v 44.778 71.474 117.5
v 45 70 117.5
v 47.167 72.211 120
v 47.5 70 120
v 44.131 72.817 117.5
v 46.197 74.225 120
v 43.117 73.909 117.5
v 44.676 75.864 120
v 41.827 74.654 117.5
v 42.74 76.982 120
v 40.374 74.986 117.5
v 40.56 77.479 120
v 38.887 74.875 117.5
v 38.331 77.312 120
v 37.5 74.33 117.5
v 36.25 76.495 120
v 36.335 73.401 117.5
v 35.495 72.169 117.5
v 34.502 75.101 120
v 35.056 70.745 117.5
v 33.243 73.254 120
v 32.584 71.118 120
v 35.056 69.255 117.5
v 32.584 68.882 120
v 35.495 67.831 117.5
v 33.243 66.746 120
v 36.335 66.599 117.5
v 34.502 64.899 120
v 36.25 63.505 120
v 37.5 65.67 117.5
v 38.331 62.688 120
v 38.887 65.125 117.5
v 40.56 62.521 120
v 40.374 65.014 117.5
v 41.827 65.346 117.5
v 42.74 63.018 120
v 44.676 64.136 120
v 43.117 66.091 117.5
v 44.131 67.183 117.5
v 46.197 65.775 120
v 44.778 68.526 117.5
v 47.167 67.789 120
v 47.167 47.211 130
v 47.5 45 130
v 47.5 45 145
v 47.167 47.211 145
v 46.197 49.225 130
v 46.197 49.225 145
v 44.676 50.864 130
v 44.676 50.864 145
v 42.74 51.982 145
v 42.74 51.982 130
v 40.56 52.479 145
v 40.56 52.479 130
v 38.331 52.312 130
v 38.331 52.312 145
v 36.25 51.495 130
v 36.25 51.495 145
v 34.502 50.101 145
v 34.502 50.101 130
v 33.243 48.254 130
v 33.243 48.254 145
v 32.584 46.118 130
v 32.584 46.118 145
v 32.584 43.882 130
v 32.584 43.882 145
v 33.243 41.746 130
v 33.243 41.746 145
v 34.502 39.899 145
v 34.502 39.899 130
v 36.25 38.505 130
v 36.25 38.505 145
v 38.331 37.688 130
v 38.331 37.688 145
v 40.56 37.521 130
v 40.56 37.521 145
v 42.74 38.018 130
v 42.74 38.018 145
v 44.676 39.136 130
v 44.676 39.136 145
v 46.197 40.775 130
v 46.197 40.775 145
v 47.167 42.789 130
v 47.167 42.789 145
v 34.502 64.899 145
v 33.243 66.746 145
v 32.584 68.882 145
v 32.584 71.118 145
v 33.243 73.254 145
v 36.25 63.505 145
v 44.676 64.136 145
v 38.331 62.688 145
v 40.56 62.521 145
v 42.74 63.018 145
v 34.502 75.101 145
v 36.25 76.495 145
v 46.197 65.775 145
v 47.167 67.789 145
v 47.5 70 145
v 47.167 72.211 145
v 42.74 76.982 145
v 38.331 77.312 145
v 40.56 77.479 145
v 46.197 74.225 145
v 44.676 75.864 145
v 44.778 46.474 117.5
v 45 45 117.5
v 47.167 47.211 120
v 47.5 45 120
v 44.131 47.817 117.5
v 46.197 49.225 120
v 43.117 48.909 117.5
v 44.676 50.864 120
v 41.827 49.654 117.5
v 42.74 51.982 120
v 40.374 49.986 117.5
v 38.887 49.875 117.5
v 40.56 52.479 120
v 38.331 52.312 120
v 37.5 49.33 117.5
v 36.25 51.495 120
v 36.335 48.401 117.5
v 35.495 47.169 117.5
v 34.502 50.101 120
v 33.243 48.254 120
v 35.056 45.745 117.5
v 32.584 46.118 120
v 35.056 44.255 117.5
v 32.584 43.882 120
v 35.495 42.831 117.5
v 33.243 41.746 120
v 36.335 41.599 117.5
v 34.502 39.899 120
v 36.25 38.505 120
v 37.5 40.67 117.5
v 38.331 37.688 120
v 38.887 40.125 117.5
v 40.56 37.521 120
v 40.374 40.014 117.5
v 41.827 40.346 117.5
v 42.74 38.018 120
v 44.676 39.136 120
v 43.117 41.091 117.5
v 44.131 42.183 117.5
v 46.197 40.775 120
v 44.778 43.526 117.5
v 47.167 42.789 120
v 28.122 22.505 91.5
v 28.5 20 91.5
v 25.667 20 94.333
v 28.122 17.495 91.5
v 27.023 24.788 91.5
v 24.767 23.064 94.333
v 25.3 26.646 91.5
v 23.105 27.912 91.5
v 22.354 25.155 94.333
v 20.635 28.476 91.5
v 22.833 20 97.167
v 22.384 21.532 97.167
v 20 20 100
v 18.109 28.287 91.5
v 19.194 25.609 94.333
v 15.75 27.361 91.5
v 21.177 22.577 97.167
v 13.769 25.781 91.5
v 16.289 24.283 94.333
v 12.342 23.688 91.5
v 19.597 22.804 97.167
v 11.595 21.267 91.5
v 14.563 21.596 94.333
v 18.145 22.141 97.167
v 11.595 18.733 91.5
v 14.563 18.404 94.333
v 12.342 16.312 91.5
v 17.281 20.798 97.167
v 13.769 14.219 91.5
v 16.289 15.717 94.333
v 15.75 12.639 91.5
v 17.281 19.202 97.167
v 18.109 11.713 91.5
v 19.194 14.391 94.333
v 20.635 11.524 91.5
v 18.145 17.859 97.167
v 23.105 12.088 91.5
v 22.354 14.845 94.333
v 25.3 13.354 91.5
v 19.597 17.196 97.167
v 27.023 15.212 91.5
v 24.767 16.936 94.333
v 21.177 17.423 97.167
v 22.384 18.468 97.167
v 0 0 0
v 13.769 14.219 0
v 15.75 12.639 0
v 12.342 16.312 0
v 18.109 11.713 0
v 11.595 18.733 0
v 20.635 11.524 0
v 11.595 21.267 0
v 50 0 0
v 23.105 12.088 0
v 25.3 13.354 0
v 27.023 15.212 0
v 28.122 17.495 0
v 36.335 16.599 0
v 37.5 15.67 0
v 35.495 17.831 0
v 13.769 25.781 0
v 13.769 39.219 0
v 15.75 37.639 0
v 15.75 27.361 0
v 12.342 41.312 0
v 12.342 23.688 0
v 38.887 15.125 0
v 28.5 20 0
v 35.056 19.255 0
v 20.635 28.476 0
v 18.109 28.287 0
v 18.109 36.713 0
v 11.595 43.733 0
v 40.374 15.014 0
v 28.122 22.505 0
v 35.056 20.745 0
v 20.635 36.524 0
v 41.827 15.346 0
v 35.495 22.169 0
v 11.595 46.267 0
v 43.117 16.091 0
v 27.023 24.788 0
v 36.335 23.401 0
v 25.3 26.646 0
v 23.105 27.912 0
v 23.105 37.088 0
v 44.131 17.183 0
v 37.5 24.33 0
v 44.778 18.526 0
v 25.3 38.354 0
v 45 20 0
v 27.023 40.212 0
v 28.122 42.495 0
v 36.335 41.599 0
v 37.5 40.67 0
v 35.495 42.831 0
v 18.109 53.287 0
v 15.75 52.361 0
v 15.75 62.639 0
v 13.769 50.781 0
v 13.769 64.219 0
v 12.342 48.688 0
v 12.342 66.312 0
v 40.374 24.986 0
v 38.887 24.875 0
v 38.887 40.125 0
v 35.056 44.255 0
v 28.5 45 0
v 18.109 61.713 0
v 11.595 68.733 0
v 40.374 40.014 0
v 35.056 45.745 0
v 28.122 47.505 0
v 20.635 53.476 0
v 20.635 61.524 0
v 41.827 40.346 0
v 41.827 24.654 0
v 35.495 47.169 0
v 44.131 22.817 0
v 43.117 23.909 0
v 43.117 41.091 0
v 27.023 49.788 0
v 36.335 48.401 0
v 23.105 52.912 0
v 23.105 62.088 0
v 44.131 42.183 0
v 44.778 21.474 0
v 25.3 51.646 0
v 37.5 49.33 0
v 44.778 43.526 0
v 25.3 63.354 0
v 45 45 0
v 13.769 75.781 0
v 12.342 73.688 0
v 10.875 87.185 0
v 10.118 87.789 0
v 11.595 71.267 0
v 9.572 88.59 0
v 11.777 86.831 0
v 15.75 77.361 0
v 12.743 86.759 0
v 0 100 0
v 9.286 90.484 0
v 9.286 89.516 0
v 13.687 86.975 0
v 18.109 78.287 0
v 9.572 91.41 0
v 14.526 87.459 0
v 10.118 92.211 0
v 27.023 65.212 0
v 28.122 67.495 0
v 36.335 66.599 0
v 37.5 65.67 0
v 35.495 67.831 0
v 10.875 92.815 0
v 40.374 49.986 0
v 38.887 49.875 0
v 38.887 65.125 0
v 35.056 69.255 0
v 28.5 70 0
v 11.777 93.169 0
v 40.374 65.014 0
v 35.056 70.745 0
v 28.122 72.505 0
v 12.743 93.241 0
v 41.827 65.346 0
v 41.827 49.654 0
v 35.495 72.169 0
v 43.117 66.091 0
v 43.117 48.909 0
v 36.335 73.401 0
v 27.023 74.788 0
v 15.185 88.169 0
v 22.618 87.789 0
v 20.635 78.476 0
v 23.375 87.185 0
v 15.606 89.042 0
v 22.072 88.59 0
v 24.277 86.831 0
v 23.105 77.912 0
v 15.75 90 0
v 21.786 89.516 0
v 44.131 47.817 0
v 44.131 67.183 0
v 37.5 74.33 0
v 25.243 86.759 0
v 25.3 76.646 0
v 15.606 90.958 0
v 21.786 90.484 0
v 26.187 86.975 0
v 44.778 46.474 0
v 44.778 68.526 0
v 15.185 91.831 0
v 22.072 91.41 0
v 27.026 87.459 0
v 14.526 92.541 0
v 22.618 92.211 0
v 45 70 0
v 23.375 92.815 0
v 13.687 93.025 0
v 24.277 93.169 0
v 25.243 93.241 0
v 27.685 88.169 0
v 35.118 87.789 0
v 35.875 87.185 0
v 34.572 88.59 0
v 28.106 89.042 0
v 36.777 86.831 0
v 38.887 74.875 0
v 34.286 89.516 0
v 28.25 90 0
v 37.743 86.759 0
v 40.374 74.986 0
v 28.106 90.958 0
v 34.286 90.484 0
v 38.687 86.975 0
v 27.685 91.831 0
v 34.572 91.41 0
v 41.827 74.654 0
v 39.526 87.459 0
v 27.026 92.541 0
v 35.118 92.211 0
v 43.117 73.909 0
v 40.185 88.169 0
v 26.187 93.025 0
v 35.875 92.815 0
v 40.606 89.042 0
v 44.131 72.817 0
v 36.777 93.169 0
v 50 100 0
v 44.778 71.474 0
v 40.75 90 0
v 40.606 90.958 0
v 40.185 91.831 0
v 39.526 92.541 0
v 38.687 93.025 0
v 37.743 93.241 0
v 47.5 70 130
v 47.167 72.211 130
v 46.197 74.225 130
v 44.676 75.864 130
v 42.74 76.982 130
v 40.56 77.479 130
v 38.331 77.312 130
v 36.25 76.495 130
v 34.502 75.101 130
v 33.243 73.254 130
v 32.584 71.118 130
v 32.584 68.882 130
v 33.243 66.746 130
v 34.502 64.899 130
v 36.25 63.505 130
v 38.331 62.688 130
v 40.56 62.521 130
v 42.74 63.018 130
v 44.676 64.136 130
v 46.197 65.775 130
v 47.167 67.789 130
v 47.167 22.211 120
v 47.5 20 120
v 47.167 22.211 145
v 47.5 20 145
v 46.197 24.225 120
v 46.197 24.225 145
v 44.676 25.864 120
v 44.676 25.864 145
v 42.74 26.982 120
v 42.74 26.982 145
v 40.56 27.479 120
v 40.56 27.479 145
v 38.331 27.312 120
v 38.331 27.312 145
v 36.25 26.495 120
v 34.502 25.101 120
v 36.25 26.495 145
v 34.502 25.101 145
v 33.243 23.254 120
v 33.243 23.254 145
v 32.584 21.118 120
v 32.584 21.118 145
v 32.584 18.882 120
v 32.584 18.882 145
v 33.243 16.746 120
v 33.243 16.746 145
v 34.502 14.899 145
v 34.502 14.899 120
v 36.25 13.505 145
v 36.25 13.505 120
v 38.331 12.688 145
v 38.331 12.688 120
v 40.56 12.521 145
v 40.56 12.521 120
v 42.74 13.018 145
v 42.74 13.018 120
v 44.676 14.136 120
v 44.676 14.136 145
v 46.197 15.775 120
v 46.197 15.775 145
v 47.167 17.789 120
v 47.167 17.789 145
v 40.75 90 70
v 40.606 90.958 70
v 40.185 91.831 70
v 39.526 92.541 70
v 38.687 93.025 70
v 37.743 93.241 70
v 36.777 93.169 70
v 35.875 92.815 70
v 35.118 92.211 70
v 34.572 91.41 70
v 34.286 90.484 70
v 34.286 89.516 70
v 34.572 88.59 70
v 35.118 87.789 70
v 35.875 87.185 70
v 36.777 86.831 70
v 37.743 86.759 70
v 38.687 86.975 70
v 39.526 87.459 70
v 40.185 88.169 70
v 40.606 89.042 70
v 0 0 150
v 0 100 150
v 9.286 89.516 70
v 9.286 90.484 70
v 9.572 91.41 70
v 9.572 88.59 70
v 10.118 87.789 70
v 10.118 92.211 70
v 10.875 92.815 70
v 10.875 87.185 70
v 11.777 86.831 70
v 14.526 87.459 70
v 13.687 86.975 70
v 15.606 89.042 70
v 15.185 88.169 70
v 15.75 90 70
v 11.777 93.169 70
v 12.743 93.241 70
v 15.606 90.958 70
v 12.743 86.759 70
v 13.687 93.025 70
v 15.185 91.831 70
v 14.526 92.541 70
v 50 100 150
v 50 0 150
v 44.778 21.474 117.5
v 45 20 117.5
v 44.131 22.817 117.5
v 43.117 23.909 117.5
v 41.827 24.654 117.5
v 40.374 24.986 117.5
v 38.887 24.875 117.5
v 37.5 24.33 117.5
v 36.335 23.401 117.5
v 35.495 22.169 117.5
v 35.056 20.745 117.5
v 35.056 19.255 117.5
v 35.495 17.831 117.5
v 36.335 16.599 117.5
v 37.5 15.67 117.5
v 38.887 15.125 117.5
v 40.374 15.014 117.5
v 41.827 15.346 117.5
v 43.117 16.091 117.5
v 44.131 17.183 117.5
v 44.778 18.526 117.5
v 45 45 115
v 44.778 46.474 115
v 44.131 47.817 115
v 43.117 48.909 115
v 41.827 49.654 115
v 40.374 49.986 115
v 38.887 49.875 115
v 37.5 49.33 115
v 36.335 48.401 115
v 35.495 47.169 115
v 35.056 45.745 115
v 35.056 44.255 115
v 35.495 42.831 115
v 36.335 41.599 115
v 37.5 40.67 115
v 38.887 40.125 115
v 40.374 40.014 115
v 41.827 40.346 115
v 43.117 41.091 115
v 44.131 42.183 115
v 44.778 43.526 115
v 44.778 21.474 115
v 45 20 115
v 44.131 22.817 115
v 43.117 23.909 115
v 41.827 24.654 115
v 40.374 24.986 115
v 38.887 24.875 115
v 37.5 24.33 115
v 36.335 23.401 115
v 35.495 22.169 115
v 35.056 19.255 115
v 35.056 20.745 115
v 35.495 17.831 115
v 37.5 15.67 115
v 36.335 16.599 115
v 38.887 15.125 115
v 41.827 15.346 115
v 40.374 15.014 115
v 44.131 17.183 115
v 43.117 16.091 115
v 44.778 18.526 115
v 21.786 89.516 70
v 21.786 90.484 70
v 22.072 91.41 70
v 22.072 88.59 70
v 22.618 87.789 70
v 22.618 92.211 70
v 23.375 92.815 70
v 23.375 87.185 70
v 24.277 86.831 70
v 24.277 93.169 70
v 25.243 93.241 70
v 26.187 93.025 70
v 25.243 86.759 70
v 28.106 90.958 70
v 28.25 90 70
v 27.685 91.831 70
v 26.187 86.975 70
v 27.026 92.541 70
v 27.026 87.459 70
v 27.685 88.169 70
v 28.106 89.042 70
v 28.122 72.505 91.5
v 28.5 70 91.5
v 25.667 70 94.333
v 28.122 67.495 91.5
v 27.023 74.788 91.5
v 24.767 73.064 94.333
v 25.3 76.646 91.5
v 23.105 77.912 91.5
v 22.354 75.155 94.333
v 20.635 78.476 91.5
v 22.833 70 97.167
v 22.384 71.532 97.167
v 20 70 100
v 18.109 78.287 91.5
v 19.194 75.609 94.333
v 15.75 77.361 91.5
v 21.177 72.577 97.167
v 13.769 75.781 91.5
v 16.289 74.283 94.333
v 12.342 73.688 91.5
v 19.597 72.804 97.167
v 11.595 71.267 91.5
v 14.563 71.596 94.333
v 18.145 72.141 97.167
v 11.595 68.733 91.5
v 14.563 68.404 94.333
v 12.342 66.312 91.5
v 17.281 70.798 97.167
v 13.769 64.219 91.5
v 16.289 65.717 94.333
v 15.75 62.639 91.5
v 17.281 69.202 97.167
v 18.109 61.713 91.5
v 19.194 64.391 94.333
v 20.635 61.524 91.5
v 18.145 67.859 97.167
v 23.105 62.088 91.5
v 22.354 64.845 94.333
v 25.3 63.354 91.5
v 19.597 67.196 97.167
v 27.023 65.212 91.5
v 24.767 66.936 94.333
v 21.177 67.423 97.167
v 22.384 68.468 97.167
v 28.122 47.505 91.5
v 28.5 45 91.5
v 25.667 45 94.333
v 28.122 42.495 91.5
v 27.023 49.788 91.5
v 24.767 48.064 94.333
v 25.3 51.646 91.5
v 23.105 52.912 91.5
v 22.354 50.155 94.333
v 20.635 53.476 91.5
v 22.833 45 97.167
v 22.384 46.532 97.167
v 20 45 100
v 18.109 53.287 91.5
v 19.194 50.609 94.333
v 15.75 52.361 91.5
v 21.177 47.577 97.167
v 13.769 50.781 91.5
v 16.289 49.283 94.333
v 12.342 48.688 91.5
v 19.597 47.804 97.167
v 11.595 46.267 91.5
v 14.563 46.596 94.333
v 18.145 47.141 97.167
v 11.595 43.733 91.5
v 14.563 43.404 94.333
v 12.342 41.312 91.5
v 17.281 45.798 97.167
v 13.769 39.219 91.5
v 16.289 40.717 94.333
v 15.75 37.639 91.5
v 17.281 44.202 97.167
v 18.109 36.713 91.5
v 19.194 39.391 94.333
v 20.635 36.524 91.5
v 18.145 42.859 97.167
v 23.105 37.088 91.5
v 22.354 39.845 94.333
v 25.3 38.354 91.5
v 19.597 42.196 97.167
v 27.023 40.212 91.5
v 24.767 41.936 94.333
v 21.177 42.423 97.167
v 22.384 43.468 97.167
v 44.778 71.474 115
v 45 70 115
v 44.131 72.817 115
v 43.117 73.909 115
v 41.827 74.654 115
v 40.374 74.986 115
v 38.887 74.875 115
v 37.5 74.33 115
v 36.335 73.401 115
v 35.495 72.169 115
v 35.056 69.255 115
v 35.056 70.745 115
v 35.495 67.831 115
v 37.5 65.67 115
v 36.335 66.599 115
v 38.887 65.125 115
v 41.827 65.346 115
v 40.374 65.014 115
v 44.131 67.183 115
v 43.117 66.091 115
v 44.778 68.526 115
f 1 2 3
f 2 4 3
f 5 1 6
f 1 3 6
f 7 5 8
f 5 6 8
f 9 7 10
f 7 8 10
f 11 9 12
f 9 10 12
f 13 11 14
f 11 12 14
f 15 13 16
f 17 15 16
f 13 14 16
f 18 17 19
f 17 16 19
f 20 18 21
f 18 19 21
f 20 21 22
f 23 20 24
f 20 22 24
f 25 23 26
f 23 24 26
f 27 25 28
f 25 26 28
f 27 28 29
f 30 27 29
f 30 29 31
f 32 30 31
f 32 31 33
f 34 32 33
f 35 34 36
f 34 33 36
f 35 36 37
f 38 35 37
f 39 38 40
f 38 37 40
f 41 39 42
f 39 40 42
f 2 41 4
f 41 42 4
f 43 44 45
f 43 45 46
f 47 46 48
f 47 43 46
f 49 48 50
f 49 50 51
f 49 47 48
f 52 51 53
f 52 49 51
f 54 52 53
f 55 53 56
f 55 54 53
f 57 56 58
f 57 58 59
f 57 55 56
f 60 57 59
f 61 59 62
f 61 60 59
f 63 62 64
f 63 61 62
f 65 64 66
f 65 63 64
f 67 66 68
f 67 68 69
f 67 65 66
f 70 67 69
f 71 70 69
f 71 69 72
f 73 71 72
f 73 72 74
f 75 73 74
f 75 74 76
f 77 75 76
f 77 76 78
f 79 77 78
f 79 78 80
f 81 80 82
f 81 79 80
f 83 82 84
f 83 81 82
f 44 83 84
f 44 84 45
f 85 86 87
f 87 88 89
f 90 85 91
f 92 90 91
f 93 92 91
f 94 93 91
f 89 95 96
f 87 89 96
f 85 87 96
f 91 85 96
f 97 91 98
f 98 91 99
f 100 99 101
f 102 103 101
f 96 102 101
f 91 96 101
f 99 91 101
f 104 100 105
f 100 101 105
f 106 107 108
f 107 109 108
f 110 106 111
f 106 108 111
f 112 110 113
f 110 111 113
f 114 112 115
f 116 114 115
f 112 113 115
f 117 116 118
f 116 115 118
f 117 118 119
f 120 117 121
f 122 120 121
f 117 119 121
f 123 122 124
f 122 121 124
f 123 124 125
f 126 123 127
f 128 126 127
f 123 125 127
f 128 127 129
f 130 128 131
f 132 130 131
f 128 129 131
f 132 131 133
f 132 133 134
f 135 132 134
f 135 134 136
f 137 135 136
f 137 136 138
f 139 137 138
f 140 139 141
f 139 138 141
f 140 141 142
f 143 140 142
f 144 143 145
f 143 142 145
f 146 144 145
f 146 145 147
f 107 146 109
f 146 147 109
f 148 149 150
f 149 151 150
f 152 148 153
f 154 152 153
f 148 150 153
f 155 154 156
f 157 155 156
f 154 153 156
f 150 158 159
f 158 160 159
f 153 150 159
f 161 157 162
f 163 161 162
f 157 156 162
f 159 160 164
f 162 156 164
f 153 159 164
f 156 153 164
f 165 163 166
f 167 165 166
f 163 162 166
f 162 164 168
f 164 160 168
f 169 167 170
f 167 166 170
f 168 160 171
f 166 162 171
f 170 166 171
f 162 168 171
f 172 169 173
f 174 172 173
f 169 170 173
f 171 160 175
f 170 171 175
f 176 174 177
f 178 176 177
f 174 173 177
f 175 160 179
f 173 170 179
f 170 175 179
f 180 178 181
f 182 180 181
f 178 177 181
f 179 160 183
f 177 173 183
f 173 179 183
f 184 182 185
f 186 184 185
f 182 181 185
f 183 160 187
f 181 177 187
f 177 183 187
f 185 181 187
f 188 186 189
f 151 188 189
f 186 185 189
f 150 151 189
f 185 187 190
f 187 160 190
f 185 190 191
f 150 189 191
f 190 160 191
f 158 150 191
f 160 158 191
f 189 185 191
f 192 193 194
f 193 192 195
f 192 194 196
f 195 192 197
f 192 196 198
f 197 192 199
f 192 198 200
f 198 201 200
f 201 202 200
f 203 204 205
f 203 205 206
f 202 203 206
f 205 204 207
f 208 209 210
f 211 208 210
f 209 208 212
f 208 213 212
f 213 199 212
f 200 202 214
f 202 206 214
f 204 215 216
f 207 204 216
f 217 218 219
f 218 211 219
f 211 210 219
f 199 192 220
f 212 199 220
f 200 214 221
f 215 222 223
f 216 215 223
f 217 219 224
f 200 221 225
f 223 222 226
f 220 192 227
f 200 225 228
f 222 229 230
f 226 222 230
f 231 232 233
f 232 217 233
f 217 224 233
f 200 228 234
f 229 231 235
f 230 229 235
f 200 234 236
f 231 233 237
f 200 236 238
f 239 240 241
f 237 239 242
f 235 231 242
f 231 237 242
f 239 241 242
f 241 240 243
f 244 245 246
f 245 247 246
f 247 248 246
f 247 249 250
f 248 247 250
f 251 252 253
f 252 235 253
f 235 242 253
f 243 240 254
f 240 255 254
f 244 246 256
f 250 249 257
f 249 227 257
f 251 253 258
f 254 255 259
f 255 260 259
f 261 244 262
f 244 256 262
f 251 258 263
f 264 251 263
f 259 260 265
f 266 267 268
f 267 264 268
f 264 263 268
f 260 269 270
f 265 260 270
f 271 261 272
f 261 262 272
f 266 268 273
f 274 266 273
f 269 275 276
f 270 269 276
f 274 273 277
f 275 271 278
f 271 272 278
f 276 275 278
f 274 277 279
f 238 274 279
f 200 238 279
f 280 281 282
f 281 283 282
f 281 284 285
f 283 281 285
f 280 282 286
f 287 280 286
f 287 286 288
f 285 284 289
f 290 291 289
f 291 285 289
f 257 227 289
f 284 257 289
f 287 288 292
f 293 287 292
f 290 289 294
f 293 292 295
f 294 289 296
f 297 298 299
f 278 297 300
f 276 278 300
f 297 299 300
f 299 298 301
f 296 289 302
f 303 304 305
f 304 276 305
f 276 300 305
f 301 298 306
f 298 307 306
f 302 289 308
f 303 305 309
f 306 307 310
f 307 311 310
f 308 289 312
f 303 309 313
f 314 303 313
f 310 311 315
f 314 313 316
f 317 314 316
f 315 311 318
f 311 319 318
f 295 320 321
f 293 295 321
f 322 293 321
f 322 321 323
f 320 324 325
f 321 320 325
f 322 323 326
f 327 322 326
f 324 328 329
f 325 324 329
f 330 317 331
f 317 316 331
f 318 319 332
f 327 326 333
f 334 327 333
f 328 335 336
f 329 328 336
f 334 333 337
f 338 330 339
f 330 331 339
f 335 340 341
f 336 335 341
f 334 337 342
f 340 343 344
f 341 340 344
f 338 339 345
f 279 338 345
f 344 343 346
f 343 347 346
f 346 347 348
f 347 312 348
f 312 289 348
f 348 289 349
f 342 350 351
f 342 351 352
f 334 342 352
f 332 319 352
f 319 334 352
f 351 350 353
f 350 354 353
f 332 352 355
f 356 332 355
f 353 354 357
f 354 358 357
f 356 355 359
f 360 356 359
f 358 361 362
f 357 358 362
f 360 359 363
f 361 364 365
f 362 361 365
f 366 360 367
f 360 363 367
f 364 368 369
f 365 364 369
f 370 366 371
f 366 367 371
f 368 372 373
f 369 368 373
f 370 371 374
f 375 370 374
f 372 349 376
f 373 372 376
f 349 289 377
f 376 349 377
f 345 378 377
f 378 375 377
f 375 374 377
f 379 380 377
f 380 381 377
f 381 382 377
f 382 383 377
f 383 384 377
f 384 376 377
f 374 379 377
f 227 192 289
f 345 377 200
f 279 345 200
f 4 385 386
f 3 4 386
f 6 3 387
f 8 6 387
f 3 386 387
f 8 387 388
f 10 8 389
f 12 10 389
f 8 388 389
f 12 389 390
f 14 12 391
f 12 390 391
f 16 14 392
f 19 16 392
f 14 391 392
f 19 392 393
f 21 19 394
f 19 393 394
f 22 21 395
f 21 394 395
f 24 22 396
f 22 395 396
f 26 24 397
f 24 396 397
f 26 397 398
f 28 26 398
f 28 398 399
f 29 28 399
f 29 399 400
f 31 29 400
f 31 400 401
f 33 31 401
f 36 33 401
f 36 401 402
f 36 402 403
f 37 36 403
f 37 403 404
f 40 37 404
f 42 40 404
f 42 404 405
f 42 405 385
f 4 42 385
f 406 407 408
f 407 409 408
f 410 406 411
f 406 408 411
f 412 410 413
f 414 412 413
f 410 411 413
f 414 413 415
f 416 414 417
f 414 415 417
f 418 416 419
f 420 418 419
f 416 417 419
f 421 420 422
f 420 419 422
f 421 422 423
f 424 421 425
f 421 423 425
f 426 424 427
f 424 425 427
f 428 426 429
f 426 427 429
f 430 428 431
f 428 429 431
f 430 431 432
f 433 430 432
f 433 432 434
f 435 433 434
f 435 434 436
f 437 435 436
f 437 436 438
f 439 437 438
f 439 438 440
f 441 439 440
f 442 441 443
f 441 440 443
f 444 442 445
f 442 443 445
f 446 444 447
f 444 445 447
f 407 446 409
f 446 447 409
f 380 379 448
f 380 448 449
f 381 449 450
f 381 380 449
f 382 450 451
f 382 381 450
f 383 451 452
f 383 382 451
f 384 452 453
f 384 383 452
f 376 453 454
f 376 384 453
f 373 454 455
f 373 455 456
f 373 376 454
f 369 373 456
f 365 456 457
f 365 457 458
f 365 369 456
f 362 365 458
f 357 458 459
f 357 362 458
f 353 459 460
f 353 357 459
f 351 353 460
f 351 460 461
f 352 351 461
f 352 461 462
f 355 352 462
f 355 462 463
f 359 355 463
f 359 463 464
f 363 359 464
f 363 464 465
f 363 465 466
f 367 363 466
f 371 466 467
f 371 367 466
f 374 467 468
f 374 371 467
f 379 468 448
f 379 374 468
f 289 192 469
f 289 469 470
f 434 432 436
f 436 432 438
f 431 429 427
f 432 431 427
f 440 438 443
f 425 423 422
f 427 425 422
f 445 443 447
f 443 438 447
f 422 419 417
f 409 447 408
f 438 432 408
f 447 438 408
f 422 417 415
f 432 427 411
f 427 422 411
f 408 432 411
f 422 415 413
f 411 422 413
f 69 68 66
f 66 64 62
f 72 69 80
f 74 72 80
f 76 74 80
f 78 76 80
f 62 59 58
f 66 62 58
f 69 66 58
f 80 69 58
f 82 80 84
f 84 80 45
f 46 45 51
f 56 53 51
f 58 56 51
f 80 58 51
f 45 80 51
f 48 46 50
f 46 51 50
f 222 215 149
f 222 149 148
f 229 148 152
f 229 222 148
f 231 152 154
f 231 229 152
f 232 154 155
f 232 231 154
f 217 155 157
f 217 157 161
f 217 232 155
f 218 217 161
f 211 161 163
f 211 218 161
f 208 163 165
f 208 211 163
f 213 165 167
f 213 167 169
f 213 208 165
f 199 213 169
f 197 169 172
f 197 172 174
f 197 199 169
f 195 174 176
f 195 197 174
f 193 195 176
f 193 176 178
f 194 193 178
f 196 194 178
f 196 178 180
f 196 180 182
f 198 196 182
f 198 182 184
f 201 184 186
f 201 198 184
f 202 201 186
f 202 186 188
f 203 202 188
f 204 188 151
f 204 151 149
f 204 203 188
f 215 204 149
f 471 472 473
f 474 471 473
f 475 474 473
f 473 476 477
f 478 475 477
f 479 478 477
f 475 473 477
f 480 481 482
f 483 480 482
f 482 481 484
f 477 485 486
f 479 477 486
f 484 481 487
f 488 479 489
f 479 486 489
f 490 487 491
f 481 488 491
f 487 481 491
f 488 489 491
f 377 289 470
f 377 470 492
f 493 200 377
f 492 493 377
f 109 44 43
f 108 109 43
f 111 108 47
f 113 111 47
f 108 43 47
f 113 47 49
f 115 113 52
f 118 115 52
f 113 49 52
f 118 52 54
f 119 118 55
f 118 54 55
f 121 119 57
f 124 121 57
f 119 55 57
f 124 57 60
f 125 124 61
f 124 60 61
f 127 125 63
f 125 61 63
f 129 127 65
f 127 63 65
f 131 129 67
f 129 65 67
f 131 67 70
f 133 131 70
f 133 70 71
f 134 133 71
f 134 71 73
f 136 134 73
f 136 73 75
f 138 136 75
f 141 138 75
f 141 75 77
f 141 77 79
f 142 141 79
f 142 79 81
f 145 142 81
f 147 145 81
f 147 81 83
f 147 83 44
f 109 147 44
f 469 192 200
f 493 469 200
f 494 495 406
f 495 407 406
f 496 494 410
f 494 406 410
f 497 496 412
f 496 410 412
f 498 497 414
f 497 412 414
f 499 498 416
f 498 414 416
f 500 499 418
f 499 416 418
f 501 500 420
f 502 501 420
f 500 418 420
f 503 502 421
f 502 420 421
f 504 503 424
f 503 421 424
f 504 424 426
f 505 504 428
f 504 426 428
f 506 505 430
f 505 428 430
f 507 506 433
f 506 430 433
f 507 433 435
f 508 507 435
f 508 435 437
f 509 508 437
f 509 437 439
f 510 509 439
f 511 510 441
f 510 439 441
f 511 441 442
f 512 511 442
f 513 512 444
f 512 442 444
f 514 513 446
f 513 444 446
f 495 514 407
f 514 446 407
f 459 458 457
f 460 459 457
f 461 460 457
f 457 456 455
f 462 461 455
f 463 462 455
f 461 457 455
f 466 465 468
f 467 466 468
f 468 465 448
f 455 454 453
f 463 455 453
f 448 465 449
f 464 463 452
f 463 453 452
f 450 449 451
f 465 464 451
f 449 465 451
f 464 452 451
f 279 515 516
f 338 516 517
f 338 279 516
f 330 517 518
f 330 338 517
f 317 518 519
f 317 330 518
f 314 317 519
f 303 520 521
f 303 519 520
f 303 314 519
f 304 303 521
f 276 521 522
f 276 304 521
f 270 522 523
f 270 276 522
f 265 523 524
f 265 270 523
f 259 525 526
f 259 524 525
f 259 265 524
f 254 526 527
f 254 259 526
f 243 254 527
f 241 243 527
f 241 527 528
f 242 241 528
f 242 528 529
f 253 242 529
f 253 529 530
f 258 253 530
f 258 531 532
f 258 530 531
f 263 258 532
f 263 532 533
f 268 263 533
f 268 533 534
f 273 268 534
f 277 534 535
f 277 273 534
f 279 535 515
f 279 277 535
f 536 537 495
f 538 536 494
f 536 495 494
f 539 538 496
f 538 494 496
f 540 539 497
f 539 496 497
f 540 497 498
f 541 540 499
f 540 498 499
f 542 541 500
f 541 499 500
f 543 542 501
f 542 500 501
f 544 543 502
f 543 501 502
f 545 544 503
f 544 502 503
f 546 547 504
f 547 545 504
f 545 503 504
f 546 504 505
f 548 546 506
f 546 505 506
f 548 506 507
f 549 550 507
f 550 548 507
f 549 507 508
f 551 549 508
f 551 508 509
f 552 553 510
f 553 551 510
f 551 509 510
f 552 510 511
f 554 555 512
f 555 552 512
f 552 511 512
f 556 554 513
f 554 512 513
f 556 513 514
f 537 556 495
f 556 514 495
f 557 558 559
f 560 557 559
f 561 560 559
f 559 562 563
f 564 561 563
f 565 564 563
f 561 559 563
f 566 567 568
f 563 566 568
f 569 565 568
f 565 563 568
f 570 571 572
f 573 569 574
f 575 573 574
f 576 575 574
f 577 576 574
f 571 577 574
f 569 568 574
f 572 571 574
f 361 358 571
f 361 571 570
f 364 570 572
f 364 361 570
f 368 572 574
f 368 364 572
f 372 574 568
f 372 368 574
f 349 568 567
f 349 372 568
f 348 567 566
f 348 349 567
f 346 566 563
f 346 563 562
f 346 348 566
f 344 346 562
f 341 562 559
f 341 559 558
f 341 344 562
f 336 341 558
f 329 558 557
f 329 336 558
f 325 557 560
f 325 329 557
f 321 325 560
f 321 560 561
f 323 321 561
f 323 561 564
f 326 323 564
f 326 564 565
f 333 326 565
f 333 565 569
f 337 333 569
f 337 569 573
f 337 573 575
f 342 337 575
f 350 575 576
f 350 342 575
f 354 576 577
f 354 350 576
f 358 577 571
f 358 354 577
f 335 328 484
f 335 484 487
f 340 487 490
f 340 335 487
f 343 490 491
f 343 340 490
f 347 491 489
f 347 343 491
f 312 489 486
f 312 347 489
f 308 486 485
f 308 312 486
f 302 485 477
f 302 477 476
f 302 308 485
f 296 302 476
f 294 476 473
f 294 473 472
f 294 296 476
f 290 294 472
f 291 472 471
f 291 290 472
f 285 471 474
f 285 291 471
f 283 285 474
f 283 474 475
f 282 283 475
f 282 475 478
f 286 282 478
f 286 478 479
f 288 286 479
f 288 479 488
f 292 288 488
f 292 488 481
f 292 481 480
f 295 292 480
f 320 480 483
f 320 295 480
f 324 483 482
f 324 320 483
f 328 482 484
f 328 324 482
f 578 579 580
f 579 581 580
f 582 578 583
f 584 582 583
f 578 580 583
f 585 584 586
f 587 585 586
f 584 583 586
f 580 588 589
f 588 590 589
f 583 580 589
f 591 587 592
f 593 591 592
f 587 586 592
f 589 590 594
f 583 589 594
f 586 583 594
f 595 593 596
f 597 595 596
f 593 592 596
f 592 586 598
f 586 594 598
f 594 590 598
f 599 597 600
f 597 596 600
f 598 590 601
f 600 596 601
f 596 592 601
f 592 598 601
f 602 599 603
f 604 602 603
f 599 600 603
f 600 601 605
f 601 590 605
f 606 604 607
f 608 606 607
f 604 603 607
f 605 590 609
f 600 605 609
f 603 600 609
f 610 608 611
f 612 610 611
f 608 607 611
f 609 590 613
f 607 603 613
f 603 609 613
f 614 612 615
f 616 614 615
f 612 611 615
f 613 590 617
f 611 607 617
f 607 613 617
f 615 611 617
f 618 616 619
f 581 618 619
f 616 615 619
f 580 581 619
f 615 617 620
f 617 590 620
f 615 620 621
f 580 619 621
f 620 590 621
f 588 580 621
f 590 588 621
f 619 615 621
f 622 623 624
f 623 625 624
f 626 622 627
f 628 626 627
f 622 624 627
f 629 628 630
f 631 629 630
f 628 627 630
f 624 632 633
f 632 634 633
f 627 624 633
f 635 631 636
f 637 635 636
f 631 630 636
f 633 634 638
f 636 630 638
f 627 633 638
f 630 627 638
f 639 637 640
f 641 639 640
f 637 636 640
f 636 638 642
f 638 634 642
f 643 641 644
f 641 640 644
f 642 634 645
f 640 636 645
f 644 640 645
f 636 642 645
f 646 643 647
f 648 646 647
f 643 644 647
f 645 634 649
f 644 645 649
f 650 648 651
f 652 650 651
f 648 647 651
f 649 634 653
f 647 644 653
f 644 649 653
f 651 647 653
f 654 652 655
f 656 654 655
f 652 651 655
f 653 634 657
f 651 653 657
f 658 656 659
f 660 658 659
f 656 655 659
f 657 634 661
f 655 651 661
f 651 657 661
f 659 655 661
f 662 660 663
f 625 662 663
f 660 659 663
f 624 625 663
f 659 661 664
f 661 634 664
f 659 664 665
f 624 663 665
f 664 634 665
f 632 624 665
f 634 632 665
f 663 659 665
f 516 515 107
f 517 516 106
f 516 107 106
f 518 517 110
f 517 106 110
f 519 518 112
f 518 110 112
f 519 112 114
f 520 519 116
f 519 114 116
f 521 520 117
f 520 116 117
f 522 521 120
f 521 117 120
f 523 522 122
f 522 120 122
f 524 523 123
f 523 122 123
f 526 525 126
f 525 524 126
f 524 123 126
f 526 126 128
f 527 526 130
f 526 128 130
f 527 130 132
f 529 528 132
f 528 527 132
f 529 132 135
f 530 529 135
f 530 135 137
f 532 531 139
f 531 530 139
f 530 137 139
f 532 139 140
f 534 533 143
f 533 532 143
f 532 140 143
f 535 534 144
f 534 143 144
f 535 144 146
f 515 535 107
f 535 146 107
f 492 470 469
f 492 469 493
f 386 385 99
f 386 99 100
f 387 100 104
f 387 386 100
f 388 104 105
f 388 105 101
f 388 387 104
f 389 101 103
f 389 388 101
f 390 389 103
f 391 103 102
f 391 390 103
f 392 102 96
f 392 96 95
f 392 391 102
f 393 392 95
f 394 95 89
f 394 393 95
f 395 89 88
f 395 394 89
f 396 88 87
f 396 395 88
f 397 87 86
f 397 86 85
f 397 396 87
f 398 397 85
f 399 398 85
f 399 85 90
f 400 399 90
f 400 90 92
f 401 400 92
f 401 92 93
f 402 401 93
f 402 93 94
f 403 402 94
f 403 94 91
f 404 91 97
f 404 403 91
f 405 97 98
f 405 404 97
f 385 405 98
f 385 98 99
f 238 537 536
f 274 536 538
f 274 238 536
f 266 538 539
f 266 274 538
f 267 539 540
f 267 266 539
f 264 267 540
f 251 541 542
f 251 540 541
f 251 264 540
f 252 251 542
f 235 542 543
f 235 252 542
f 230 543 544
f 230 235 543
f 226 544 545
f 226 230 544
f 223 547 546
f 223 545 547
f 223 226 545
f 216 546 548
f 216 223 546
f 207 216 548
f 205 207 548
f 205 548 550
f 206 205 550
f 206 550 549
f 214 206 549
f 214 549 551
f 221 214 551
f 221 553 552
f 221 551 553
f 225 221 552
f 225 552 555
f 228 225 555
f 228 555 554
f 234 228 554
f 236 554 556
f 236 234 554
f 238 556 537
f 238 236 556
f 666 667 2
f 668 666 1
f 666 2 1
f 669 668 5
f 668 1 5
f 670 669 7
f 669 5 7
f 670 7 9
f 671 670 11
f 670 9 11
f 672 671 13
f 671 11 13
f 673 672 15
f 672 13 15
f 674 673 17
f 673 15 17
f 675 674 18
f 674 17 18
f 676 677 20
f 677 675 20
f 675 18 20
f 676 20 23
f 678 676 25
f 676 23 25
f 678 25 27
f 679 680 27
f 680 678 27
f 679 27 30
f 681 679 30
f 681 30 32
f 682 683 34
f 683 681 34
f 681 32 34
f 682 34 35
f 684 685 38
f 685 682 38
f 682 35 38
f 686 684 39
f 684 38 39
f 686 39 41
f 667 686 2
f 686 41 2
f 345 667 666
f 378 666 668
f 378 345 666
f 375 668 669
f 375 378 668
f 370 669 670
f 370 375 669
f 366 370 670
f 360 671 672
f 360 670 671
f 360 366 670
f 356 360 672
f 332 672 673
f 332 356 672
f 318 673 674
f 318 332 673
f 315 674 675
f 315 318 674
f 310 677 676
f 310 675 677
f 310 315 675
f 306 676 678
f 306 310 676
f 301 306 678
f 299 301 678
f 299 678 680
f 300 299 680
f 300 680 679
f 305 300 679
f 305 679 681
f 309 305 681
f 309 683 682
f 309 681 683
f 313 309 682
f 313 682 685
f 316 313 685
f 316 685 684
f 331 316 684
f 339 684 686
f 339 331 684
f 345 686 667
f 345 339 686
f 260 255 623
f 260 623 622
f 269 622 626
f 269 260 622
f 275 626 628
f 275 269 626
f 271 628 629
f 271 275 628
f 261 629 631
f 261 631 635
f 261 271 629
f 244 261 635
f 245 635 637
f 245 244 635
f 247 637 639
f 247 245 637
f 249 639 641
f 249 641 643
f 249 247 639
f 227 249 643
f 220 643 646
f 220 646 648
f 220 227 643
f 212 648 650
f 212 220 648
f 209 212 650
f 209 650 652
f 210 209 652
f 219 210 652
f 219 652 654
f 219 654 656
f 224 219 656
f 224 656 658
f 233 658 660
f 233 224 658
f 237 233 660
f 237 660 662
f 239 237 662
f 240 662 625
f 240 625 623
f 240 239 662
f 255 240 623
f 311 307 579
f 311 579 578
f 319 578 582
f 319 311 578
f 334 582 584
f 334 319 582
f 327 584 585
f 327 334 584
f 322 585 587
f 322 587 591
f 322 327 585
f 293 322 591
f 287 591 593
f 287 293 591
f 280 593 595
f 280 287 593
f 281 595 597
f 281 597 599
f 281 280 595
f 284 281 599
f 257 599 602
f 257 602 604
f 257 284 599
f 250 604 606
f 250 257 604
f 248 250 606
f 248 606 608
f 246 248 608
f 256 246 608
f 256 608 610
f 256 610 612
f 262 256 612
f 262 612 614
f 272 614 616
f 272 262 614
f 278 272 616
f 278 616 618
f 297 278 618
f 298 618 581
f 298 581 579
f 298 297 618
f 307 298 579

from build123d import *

# Parameters (mm, degrees)
F0_W          = 50
F0_H          = 100
F0_R          = 8.5
F0_R_2        = 5
F0_R_3        = 3.25
F1_DEPTH      = 150
F2_DEPTH      = 100
F3_DEPTH      = 70
F4_DEPTH      = 130
F8_R          = 7.5
F9_DEPTH      = 15
F10_S5_R      = 5
F10_T6_DEPTH  = 12
F10_S11_R     = 5
F10_T12_DEPTH = 12
F10_S17_R     = 5
F10_T18_DEPTH = 12
F11_SIZE      = 8.5


# Not quite as in the source:
# - a fillet or chamfer that OpenCascade refuses, or shapes differently, is made with other operations: its cross-section is extruded or revolved along the edge and cut away or added


with BuildPart() as f1:
    # F0 (on Top) → F1 (new body)
    with BuildSketch(Plane.XY):
        with Locations((25, 50)):
            Rectangle(F0_W, F0_H)
        with Locations((20, 20)):
            Circle(F0_R, mode=Mode.SUBTRACT)
        with Locations((20, 45)):
            Circle(F0_R, mode=Mode.SUBTRACT)
        with Locations((40, 20)):
            Circle(F0_R_2, mode=Mode.SUBTRACT)
        with Locations((40, 45)):
            Circle(F0_R_2, mode=Mode.SUBTRACT)
        with Locations((20, 70)):
            Circle(F0_R, mode=Mode.SUBTRACT)
        with Locations((12.5, 90)):
            Circle(F0_R_3, mode=Mode.SUBTRACT)
        with Locations((40, 70)):
            Circle(F0_R_2, mode=Mode.SUBTRACT)
        with Locations((25, 90)):
            Circle(F0_R_3, mode=Mode.SUBTRACT)
        with Locations((37.5, 90)):
            Circle(F0_R_3, mode=Mode.SUBTRACT)
        with Locations((12.5, 90)):
            Circle(F0_R_3)
        with Locations((25, 90)):
            Circle(F0_R_3)
        with Locations((37.5, 90)):
            Circle(F0_R_3)
        with Locations((40, 70)):
            Circle(F0_R_2)
        with Locations((20, 70)):
            Circle(F0_R)
        with Locations((40, 45)):
            Circle(F0_R_2)
        with Locations((40, 20)):
            Circle(F0_R_2)
        with Locations((20, 20)):
            Circle(F0_R)
        with Locations((20, 45)):
            Circle(F0_R)
    extrude(amount=F1_DEPTH)

    # F0 (on Top) → F2 (cut)
    with BuildSketch(Plane.XY):
        with Locations((20, 20)):
            Circle(F0_R)
        with Locations((20, 45)):
            Circle(F0_R)
        with Locations((20, 70)):
            Circle(F0_R)
    extrude(amount=F2_DEPTH, mode=Mode.SUBTRACT)

    # F0 (on Top) → F3 (cut)
    with BuildSketch(Plane.XY):
        with Locations((37.5, 90)):
            Circle(F0_R_3)
        with Locations((25, 90)):
            Circle(F0_R_3)
        with Locations((12.5, 90)):
            Circle(F0_R_3)
    extrude(amount=F3_DEPTH, mode=Mode.SUBTRACT)

    # F0 (on Top) → F4 (cut)
    with BuildSketch(Plane.XY):
        with Locations((40, 20)):
            Circle(F0_R_2)
        with Locations((40, 45)):
            Circle(F0_R_2)
        with Locations((40, 70)):
            Circle(F0_R_2)
    extrude(amount=F4_DEPTH, mode=Mode.SUBTRACT)

    # F8 (on 3pt) → F9 (cut, symmetric)
    with BuildSketch(Plane.XY.offset(130)):
        with Locations((40, 70)):
            Circle(F8_R)
        with Locations((40, 45)):
            Circle(F8_R)
        with Locations((40, 20)):
            Circle(F8_R)
    extrude(amount=F9_DEPTH, both=True, mode=Mode.SUBTRACT)

    # F10: chamfer of 5 on 3 edges, made by hand


with BuildPart() as f10_tool2:
    # F10_s3 → F10_t4 (revolve)
    with BuildSketch(Plane.XZ.offset(-70)):
        Polygon((42.5, 115), (47.5, 120), (47.5, 115), align=None)
    revolve(axis=Axis((40, 70, 115), (0, 0, 1)))

    # F10_s5 → F10_t6 (cut, symmetric)
    with BuildSketch(Plane.XY.offset(117.5)):
        with Locations((40, 70)):
            Circle(F10_S5_R)
    extrude(amount=F10_T6_DEPTH, both=True, mode=Mode.SUBTRACT)


with BuildPart() as f1_1:
    add(f1.part)

    # F10_t1: union F10_tool2
    add(f10_tool2.part)


with BuildPart() as f10_tool8:
    # F10_s9 → F10_t10 (revolve)
    with BuildSketch(Plane.XZ.offset(-45)):
        Polygon((42.5, 115), (47.5, 120), (47.5, 115), align=None)
    revolve(axis=Axis((40, 45, 115), (0, 0, 1)))

    # F10_s11 → F10_t12 (cut, symmetric)
    with BuildSketch(Plane.XY.offset(117.5)):
        with Locations((40, 45)):
            Circle(F10_S11_R)
    extrude(amount=F10_T12_DEPTH, both=True, mode=Mode.SUBTRACT)


with BuildPart() as f1_2:
    add(f1_1.part)

    # F10_t7: union F10_tool8
    add(f10_tool8.part)


with BuildPart() as f10_tool14:
    # F10_s15 → F10_t16 (revolve)
    with BuildSketch(Plane.XZ.offset(-20)):
        Polygon((42.5, 115), (47.5, 120), (47.5, 115), align=None)
    revolve(axis=Axis((40, 20, 115), (0, 0, 1)))

    # F10_s17 → F10_t18 (cut, symmetric)
    with BuildSketch(Plane.XY.offset(117.5)):
        with Locations((40, 20)):
            Circle(F10_S17_R)
    extrude(amount=F10_T18_DEPTH, both=True, mode=Mode.SUBTRACT)


with BuildPart() as f1_3:
    add(f1_2.part)

    # F10_t13: union F10_tool14
    add(f10_tool14.part)

    # F11
    f11_edges = [f1_3.edges().sort_by_distance(p)[0] for p in [
        (11.5, 70, 100),
        (11.5, 45, 100),
        (11.5, 20, 100),
    ]]
    chamfer(f11_edges, length=F11_SIZE)


solid = f1_3.part
